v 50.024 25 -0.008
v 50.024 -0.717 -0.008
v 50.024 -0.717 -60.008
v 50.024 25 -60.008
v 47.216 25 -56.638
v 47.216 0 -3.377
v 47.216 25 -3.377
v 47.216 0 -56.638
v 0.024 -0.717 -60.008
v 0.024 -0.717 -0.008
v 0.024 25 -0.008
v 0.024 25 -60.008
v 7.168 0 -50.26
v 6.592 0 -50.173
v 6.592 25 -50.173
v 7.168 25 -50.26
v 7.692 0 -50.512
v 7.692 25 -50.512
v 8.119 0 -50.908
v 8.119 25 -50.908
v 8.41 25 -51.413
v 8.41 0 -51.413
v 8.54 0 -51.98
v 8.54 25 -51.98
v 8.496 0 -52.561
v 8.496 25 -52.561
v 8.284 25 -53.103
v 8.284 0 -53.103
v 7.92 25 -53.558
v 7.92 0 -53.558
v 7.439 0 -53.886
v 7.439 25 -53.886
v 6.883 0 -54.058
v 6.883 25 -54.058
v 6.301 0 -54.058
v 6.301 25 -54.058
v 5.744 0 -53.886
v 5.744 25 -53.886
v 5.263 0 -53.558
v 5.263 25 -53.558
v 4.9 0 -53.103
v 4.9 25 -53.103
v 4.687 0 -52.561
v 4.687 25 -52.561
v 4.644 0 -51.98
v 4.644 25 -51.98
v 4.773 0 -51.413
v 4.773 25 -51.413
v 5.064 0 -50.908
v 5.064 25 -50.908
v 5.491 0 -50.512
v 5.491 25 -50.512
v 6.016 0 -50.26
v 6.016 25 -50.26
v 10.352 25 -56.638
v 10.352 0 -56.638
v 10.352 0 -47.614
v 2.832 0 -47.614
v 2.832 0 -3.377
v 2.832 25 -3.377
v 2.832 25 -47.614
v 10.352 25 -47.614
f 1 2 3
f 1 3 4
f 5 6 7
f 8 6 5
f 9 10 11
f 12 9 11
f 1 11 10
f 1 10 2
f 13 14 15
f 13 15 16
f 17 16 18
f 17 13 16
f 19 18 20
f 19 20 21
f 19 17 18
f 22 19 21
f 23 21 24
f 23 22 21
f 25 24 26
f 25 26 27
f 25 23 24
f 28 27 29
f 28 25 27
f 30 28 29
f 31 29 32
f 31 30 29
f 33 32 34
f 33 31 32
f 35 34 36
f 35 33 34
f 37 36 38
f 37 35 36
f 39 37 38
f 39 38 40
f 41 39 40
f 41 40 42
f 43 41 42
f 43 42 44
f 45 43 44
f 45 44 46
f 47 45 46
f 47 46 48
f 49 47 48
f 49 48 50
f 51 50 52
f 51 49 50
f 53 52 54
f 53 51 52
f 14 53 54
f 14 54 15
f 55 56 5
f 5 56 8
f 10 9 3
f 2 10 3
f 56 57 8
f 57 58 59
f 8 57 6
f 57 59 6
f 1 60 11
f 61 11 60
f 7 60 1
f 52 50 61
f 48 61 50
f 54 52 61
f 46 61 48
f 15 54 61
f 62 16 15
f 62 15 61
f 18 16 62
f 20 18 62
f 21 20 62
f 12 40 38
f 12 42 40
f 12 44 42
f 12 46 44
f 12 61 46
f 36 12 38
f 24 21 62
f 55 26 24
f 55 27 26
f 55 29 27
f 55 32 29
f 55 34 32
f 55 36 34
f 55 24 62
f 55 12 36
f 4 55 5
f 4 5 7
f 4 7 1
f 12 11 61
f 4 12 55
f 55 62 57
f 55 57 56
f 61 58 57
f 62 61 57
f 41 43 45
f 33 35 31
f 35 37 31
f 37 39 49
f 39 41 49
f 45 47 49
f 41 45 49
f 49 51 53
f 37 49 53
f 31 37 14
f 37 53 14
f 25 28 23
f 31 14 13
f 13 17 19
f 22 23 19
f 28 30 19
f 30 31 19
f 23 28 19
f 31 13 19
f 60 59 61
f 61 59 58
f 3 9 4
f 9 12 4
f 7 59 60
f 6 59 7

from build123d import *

# Parameters (mm, degrees)
SKETCH_1_W      = 50
SKETCH_1_H      = 60
SKETCH_1_W_2    = 44.384719817
SKETCH_1_H_2    = 53.261663781
SKETCH_1_W_3    = 7.520038949
SKETCH_1_H_3    = 9.02404674
SKETCH_1_R      = 1.953472296
EXTRUDE_1_DEPTH = 25
SKETCH_2_W      = 50
SKETCH_2_H      = 0.716883707
EXTRUDE_2_DEPTH = 60


with BuildPart() as part:
    # Эскиз1 → Бобышка-Вытянуть1 (new body)
    # profile 1 of 2: a face of its own
    with BuildSketch(Plane(origin=(0, 0, 0), x_dir=(1, 0, 0), z_dir=(0, 1, 0))):
        with Locations((25.024105357, 30.007635335)):
            Rectangle(SKETCH_1_W, SKETCH_1_H)
        with Locations((25.024105358, 30.007635335)):
            Rectangle(SKETCH_1_W_2, SKETCH_1_H_2, mode=Mode.SUBTRACT)
    # profile 2 of 2: a face of its own
    with BuildSketch(Plane(origin=(0, 0, 0), x_dir=(1, 0, 0), z_dir=(0, 1, 0))):
        with Locations((6.591764924, 52.126443855)):
            Rectangle(SKETCH_1_W_3, SKETCH_1_H_3)
        with Locations(Location((6.591764924, 52.126443855, 0), (0, 0, 270))):
            Circle(SKETCH_1_R, mode=Mode.SUBTRACT)
    extrude(amount=EXTRUDE_1_DEPTH)

    # Эскиз2 → Бобышка-Вытянуть2 (add)
    with BuildSketch(Plane.XY.offset(-0.007635335)):
        with Locations((25.024105357, -0.358441854)):
            Rectangle(SKETCH_2_W, SKETCH_2_H)
    extrude(amount=-EXTRUDE_2_DEPTH)


solid = part.part
